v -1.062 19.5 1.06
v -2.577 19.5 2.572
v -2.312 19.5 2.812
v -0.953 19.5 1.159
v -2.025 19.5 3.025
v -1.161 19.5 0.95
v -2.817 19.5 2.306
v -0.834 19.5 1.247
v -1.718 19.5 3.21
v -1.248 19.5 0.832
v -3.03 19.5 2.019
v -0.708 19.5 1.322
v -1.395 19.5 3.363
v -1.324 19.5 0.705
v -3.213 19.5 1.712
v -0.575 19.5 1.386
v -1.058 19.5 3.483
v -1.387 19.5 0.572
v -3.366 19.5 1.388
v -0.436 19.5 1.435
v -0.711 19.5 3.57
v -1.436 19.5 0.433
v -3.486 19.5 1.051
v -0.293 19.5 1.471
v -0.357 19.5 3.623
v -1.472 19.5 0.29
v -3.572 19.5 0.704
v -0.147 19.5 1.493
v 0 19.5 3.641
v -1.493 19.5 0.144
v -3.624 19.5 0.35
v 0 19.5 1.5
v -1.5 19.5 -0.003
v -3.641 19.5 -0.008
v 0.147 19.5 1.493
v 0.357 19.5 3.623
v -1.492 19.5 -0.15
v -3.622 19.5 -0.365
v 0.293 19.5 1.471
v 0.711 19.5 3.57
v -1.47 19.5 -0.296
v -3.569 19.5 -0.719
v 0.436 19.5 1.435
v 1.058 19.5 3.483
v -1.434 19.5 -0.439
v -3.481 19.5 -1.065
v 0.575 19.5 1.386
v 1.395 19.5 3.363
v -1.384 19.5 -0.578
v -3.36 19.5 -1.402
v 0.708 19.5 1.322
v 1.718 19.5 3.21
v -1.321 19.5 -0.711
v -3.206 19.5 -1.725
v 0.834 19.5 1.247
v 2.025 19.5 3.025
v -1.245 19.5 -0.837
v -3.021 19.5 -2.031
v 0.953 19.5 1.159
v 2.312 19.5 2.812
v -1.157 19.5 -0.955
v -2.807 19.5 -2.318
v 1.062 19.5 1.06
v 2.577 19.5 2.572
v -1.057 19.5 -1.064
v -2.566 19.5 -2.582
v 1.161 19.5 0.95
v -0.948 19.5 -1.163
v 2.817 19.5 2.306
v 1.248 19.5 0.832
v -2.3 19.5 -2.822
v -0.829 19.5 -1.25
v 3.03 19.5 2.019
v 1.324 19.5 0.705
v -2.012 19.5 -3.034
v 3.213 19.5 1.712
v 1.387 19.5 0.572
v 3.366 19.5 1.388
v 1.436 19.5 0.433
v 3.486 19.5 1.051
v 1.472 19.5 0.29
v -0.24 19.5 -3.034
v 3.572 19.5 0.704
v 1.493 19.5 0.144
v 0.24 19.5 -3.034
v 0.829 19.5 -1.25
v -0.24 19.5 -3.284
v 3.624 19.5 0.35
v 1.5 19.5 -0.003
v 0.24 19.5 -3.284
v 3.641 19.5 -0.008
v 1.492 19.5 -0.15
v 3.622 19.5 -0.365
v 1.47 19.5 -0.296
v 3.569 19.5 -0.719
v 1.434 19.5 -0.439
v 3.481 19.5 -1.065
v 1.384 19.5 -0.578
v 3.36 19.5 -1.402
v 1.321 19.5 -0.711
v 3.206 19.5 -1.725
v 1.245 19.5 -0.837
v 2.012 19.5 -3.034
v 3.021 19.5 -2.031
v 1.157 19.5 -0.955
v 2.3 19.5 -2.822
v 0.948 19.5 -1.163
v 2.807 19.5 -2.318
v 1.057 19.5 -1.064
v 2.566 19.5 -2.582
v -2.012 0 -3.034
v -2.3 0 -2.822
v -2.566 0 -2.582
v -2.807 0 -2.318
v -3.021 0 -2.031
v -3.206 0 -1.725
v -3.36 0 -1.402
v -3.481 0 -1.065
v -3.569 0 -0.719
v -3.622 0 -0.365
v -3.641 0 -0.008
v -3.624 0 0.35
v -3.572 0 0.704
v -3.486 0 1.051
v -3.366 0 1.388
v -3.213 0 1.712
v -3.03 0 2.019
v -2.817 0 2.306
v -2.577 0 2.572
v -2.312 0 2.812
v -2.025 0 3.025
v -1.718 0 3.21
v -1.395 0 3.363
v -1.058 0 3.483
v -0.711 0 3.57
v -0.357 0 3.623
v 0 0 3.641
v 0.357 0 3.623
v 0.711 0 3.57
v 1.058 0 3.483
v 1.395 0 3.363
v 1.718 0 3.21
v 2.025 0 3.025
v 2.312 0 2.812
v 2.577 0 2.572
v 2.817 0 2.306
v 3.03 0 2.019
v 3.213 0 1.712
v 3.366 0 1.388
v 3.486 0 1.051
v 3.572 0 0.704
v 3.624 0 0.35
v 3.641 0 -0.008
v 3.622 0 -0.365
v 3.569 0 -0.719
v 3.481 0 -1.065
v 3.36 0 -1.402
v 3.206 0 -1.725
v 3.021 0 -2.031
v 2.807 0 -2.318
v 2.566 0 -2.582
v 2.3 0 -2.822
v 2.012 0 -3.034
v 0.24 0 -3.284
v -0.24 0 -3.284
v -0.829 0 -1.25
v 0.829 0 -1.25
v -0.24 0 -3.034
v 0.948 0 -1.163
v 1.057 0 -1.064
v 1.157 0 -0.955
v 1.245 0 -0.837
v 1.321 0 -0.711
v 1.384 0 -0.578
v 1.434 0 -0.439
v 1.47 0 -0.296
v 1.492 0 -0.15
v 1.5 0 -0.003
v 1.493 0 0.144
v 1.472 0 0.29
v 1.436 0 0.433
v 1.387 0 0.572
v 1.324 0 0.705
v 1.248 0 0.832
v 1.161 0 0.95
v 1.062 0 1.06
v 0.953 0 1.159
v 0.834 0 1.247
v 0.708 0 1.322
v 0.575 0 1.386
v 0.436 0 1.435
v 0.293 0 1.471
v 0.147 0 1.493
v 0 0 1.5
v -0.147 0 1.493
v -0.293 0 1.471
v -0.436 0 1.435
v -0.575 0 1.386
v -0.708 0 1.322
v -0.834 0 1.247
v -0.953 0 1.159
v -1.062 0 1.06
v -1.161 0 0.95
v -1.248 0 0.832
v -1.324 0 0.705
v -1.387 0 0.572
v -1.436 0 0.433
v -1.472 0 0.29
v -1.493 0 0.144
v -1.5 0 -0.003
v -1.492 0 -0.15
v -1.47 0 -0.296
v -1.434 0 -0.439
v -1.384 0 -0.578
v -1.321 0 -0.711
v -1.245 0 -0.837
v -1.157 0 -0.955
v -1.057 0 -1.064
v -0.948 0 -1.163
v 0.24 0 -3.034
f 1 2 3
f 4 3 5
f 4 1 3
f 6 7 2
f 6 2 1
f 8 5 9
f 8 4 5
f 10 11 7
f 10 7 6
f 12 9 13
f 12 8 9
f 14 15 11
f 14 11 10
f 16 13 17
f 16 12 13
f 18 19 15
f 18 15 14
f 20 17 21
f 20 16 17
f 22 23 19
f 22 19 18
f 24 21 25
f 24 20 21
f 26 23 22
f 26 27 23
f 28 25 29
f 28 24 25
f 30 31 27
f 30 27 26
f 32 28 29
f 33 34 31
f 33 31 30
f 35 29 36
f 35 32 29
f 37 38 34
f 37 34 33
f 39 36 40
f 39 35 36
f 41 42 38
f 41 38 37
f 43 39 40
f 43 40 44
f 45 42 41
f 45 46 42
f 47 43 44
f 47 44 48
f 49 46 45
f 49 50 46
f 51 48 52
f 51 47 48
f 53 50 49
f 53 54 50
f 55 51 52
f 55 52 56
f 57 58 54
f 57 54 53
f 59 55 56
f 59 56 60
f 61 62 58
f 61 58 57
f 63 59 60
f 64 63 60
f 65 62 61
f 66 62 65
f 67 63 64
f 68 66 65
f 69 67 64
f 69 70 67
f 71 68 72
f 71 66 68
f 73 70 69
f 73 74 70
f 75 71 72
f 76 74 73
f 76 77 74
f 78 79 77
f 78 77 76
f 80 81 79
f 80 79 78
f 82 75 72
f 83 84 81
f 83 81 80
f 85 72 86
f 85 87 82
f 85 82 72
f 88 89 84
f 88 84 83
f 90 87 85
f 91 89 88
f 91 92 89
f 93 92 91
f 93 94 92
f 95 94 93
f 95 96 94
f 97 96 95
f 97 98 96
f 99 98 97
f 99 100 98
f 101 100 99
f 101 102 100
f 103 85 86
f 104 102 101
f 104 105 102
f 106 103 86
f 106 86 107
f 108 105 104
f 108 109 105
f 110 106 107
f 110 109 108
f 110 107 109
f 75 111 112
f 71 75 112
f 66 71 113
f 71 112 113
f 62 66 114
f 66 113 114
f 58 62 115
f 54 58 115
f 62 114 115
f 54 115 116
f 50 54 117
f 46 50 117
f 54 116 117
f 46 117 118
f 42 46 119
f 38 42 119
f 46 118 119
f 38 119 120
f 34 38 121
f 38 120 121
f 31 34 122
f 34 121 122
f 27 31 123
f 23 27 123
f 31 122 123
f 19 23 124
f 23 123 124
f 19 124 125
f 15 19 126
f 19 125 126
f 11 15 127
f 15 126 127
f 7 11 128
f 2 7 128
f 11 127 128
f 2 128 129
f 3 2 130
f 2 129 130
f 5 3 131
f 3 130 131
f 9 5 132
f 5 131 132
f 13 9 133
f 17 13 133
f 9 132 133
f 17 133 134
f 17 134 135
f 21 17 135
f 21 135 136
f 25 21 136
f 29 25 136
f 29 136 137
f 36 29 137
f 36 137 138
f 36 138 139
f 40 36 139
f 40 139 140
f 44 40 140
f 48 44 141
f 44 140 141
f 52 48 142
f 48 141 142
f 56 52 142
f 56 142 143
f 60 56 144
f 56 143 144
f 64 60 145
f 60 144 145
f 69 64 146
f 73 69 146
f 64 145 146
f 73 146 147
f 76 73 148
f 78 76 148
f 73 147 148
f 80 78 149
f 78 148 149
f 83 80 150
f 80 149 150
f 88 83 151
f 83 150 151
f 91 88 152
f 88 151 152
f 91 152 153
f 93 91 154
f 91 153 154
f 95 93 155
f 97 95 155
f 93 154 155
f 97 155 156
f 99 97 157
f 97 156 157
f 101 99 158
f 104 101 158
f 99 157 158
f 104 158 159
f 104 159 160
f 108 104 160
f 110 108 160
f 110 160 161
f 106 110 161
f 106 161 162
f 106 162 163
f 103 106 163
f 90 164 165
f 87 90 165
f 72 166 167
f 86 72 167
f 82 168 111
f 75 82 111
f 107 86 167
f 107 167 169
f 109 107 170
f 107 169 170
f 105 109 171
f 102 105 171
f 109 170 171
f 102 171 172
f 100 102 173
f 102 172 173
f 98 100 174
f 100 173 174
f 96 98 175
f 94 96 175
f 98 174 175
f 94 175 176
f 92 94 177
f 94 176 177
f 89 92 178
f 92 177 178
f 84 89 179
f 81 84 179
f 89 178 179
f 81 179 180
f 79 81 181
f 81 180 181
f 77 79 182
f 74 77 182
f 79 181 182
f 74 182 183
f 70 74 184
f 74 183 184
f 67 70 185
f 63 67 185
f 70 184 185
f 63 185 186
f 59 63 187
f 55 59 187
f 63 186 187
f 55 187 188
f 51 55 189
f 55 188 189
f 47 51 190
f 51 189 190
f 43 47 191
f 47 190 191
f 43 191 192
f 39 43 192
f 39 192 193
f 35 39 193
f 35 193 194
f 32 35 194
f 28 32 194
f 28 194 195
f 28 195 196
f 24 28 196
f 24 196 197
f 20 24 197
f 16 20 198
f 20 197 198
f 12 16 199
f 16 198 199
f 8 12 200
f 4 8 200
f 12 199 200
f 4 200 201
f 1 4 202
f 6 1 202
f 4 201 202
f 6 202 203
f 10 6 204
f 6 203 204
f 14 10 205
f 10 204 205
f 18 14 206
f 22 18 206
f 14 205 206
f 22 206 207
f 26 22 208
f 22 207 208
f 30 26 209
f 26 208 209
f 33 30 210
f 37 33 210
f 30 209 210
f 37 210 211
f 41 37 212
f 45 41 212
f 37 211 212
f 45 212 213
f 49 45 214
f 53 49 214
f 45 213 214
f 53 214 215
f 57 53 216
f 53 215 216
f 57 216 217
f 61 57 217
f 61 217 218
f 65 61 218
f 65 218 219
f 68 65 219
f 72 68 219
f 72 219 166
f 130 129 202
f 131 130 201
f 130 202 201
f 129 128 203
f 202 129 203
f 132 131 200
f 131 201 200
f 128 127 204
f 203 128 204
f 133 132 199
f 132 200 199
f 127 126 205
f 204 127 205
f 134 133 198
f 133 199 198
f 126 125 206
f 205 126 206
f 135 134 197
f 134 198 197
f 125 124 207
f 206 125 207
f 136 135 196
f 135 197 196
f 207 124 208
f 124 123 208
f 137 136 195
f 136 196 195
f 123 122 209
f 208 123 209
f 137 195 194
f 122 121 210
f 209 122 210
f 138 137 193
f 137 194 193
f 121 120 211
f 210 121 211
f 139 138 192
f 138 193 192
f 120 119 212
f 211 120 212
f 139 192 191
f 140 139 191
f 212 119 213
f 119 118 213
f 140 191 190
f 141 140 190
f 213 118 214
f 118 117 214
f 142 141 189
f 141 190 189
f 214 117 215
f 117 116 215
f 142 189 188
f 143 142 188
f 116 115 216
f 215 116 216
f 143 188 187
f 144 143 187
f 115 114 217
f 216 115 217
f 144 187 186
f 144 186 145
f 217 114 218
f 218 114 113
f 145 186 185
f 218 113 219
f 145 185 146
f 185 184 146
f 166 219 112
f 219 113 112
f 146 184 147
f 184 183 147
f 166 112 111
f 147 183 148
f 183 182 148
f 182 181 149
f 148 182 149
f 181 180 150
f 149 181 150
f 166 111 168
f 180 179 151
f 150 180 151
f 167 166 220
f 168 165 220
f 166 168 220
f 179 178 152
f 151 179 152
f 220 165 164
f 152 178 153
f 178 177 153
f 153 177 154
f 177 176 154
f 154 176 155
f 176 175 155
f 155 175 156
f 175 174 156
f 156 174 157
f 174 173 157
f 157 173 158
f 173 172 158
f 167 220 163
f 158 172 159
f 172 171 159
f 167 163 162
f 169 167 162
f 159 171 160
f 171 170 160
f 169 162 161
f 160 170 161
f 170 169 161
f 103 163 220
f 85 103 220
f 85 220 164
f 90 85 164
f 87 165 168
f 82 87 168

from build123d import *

# Parameters (mm, degrees)
EXTRUDE_1_DEPTH = 19.5


with BuildPart() as part:
    # 草图1 → 凸台-拉伸1 (new body)
    with BuildSketch(Plane(origin=(0, 0, 0), x_dir=(1, 0, 0), z_dir=(0, 1, 0))):
        with BuildLine():
            Line((-0.240061086, 3.033784066), (-2.012384688, 3.033784066))
            ThreePointArc((-2.012384688, 3.033784066), (0, -3.640540879), (2.012384688, 3.033784066))
            Line((2.012384688, 3.033784066), (0.240061086, 3.033784066))
            Line((0.240061086, 3.033784066), (0.240061086, 3.283784066))
            Line((0.240061086, 3.283784066), (-0.240061086, 3.283784066))
            Line((-0.240061086, 3.283784066), (-0.240061086, 3.033784066))
        make_face()
        with BuildLine():
            Line((-0.829156198, 1.25), (0.829156198, 1.25))
            ThreePointArc((0.829156198, 1.25), (0, -1.5), (-0.829156198, 1.25))
        make_face(mode=Mode.SUBTRACT)
    extrude(amount=EXTRUDE_1_DEPTH)


solid = part.part
